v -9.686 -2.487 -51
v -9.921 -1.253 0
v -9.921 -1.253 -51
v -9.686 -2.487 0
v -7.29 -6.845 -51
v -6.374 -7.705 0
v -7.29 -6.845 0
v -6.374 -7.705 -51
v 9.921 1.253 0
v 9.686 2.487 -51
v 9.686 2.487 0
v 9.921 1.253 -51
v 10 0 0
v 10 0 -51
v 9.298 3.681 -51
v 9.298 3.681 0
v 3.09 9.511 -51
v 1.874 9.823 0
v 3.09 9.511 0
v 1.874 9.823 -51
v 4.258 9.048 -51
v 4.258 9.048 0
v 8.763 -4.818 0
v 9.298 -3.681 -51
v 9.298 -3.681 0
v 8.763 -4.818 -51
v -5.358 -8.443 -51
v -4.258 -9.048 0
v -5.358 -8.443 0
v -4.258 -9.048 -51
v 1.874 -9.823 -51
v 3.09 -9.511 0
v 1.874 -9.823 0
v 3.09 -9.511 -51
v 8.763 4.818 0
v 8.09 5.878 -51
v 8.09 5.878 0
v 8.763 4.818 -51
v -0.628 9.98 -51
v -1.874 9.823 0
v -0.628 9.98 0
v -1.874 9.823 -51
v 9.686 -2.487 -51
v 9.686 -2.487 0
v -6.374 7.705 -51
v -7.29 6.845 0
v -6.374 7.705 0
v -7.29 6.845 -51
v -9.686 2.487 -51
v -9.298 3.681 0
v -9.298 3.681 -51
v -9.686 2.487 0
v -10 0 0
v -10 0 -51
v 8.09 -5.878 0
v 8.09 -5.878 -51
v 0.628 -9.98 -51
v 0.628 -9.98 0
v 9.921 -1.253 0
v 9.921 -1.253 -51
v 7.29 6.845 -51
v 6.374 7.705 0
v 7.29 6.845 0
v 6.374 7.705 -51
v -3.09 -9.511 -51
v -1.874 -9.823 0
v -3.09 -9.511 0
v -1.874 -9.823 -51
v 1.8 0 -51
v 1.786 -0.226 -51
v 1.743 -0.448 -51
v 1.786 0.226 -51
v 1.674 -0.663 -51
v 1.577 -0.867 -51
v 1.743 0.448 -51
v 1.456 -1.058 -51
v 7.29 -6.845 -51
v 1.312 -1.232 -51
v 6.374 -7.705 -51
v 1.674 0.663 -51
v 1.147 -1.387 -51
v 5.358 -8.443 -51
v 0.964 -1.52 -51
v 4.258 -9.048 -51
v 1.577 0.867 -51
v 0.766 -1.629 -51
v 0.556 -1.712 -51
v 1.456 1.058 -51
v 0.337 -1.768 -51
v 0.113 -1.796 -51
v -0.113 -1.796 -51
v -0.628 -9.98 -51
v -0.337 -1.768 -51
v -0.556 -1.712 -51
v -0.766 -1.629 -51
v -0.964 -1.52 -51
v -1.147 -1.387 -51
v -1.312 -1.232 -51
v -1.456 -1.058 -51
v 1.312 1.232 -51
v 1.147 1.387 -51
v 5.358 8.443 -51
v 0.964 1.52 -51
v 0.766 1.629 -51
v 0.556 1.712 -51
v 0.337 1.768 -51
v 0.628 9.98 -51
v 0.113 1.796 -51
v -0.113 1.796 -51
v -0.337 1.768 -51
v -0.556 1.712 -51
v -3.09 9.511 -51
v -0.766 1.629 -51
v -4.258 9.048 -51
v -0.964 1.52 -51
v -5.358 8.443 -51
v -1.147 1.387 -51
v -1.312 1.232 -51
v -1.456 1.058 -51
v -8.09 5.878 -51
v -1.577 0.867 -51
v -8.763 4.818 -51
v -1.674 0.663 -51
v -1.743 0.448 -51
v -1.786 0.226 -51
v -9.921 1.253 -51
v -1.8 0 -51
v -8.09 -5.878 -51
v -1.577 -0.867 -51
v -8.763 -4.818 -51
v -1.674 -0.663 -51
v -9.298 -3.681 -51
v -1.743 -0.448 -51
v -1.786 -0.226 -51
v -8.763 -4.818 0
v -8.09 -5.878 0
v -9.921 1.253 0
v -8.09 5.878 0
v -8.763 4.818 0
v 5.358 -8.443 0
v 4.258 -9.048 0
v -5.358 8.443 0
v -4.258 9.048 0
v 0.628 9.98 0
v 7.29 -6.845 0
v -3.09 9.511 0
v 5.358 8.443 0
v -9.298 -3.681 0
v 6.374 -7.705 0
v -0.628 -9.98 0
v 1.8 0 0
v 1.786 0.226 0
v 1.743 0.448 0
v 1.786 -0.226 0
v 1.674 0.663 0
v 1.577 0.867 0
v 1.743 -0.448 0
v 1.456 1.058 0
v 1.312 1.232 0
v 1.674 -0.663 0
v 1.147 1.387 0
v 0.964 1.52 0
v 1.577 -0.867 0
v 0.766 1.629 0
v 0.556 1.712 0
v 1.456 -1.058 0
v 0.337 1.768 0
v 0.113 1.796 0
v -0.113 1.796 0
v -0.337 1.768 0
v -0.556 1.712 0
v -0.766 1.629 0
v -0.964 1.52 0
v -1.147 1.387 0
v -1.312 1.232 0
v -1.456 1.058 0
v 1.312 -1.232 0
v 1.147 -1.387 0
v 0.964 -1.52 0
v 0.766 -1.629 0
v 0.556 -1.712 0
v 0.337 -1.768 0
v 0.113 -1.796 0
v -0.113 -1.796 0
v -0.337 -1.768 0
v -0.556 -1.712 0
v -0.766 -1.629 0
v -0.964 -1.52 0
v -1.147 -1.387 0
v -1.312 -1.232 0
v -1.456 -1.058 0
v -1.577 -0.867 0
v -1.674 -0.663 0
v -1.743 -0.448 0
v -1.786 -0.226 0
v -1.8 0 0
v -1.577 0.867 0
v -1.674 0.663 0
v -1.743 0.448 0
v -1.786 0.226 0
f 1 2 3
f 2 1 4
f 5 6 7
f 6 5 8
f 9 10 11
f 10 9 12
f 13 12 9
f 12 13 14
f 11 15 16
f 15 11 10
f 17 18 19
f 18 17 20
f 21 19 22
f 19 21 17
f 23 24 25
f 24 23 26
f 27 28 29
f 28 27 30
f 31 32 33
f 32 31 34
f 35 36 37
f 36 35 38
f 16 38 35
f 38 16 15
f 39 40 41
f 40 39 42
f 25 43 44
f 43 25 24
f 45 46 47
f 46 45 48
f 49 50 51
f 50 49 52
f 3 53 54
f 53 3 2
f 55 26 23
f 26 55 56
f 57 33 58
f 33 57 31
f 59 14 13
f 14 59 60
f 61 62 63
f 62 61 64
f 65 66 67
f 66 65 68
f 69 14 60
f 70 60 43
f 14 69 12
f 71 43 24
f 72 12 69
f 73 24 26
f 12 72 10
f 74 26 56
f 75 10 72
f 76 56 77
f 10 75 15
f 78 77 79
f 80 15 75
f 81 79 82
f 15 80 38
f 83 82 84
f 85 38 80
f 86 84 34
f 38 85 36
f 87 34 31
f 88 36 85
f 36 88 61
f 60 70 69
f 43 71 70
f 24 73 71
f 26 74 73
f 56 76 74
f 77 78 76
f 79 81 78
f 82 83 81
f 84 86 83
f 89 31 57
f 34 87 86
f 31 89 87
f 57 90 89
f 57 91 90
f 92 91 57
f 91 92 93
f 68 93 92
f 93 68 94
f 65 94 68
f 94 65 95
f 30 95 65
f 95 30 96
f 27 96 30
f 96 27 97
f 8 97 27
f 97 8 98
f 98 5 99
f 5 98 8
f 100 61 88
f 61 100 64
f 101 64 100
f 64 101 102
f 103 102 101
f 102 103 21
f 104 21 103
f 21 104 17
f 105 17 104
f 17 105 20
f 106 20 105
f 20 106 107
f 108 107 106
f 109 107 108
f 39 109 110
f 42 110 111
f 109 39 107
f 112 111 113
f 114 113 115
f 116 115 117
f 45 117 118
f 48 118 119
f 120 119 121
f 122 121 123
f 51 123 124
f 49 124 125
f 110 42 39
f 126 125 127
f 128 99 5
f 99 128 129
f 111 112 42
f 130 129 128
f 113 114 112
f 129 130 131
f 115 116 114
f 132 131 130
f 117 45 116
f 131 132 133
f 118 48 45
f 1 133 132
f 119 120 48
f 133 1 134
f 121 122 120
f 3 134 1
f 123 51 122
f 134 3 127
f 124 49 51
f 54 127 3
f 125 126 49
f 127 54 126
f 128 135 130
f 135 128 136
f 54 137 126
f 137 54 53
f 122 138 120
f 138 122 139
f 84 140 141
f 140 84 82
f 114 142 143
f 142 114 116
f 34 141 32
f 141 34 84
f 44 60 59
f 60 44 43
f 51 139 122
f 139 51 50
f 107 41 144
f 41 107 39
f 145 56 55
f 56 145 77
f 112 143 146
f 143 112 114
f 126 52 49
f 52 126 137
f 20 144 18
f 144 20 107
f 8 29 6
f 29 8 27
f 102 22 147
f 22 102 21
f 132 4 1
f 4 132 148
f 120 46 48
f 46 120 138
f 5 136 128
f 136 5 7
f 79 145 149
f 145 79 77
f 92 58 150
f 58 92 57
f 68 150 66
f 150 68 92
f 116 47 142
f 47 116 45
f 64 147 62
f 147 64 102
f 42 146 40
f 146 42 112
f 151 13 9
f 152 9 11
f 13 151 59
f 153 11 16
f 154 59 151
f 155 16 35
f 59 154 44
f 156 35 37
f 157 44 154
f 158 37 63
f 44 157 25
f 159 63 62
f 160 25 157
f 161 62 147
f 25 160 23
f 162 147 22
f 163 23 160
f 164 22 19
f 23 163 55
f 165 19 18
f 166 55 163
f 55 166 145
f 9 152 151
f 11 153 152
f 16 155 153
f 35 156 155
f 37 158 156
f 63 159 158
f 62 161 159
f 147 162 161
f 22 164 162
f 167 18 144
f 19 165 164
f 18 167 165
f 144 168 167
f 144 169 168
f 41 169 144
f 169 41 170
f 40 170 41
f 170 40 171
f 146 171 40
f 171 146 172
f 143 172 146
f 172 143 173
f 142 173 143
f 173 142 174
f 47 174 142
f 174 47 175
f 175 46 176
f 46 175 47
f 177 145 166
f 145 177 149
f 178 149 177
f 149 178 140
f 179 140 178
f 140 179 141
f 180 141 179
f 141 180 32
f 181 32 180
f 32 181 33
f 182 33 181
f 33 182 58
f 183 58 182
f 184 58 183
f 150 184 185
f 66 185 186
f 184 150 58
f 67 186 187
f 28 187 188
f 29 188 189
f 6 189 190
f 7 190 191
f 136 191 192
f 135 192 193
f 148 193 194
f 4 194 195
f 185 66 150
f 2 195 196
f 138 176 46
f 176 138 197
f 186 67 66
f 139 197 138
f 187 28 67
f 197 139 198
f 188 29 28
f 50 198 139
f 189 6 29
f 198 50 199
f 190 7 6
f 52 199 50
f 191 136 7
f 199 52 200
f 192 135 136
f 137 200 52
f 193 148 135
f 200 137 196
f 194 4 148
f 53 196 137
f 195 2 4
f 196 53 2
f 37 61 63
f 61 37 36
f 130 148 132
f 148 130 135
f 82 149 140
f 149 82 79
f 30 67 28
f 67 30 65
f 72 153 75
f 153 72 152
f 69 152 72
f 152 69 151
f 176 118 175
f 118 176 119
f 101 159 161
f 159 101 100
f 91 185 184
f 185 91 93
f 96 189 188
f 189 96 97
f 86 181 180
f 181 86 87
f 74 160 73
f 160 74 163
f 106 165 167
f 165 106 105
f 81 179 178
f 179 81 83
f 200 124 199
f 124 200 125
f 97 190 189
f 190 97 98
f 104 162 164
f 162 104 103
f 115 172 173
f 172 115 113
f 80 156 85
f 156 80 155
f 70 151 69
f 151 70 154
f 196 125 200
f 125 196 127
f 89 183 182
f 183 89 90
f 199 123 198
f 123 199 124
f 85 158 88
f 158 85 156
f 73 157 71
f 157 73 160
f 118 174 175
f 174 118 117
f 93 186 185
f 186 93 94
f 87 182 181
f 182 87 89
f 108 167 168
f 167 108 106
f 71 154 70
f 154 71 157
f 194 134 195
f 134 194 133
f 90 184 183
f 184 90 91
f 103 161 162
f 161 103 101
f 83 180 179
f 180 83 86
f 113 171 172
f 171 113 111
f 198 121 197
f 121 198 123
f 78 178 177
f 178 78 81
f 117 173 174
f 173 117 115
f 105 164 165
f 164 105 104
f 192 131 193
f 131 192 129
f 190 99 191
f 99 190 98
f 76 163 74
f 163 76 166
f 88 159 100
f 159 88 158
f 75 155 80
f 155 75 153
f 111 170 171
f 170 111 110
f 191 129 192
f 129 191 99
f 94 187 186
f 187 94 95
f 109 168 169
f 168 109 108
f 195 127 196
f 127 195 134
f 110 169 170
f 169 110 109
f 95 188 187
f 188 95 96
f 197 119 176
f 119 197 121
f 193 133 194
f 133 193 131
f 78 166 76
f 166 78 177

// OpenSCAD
$fn = 50;


difference() {
	union() {
		translate(v = [0, 0, -51.0000000000]) {
			cylinder(h = 51, r = 10.0000000000);
		}
		cylinder(h = 0, r = 19.0000000000);
	}
	union() {
		#translate(v = [0, 0, -51]) {
			cylinder(h = 51, r = 1.8000000000);
		}
	}
}
